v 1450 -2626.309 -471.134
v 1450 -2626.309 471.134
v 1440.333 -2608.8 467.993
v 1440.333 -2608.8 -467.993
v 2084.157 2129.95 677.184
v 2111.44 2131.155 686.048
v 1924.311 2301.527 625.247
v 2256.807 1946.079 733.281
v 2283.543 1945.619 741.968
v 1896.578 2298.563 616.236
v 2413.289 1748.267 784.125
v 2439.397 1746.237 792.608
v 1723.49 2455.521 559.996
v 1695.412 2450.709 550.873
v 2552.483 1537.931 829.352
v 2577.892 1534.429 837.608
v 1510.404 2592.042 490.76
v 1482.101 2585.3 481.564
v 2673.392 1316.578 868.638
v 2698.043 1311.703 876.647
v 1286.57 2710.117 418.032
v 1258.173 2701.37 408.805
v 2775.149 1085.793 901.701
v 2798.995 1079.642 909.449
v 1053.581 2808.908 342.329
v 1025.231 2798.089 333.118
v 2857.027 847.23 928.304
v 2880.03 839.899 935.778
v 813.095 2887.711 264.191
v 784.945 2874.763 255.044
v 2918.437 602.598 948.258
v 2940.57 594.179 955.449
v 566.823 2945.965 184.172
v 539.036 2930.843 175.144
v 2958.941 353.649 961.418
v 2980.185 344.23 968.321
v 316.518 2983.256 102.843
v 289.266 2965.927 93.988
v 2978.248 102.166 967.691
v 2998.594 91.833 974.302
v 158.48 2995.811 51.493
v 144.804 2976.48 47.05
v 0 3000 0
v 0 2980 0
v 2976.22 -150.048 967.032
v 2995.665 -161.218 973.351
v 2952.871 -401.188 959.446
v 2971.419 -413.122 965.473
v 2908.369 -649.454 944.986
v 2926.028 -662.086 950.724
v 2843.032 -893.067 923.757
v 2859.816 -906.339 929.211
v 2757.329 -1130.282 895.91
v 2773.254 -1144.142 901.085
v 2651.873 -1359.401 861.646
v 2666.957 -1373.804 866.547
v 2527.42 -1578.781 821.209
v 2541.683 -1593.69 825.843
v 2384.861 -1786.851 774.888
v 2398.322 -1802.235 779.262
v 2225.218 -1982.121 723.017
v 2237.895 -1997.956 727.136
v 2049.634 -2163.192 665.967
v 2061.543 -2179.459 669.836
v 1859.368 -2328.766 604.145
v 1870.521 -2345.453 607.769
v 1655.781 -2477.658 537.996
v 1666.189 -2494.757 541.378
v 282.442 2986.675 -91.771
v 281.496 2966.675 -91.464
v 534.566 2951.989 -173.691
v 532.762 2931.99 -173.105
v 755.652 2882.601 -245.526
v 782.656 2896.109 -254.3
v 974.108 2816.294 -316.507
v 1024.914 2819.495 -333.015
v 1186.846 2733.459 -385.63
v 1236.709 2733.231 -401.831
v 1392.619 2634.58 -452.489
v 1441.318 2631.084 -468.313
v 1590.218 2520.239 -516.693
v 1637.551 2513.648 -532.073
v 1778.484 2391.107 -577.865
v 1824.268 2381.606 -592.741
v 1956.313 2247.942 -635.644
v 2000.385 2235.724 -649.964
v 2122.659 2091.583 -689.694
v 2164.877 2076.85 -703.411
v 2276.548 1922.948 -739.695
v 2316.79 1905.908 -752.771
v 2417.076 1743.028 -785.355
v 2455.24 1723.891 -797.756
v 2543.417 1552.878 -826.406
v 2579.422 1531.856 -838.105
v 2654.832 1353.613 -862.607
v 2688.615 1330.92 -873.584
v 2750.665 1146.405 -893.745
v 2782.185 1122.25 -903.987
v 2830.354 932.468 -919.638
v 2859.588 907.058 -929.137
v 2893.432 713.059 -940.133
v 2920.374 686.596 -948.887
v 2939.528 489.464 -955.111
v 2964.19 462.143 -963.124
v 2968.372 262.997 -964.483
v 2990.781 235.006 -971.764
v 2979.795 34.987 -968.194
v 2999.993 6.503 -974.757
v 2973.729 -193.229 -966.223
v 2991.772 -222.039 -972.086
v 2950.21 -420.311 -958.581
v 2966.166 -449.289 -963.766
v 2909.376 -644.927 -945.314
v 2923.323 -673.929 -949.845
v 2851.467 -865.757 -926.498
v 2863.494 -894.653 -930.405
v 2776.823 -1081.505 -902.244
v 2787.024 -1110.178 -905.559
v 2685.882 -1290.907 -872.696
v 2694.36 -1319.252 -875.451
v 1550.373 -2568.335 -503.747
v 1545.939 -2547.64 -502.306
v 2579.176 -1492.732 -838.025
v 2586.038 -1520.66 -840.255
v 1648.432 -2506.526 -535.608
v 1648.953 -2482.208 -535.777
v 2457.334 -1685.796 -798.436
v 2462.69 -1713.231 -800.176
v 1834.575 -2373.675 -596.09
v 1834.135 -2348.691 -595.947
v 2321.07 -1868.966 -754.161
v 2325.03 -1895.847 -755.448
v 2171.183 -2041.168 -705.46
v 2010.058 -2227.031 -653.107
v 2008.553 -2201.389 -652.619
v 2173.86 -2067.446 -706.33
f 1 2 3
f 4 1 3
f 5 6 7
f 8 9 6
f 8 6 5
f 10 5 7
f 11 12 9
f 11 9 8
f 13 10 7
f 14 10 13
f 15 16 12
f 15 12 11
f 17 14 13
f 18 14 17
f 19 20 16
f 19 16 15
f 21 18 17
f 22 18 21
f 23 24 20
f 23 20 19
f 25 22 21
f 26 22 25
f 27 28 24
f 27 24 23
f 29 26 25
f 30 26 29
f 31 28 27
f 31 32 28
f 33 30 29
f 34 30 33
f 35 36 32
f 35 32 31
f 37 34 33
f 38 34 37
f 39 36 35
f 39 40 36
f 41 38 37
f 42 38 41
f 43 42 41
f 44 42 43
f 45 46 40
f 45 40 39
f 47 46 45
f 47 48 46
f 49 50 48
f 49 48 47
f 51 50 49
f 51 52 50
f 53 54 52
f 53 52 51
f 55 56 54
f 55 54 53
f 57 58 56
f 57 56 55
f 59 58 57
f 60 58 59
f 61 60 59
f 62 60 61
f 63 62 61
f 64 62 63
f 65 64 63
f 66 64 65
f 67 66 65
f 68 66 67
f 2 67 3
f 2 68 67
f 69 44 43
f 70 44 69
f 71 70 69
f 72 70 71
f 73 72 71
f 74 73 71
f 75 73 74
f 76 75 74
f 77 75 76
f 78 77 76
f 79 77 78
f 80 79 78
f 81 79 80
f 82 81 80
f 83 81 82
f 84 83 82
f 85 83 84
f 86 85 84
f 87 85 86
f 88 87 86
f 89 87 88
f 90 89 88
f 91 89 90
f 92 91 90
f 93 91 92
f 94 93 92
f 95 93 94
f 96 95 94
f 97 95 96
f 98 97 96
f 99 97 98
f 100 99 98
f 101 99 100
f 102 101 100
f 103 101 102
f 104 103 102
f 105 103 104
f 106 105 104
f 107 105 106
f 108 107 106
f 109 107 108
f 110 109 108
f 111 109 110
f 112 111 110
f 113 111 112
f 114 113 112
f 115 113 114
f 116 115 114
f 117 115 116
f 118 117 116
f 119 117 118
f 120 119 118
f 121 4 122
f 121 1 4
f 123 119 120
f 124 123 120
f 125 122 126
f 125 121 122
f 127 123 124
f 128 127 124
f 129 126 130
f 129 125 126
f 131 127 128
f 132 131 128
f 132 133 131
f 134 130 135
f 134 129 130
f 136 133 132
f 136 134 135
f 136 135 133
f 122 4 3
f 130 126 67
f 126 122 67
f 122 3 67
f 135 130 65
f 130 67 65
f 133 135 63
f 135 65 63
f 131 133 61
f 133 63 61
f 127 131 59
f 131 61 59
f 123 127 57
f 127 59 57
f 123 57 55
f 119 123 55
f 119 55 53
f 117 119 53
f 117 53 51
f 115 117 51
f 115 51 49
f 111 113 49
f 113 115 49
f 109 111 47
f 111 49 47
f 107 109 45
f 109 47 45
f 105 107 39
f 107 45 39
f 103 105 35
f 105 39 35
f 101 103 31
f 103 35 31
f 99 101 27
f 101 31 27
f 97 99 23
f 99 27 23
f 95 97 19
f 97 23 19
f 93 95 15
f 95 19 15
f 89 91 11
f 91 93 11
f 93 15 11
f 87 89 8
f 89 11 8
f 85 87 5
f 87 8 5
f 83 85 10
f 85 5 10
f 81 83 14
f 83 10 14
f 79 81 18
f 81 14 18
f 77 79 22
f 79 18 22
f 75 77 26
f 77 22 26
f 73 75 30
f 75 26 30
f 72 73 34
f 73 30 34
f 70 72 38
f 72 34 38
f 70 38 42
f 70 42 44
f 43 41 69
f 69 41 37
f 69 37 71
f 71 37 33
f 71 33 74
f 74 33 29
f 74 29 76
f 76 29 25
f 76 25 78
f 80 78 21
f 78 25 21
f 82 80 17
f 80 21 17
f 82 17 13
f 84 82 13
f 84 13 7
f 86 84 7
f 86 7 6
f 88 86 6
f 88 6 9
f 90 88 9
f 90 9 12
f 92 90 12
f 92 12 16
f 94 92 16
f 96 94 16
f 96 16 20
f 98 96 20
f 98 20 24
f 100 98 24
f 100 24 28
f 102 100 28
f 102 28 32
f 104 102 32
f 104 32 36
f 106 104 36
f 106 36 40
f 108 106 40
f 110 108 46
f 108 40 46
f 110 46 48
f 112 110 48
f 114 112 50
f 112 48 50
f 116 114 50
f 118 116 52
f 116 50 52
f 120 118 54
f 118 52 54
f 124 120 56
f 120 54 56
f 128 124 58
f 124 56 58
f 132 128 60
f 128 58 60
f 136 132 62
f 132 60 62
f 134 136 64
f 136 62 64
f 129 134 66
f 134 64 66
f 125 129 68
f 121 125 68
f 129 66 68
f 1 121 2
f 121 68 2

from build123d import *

# Parameters (mm, degrees)
AUFSATZ_LINEAR_AUSTRAGEN3_DEPTH      = 1500
AUFSATZ_LINEAR_AUSTRAGEN3_DEPTH_BACK = 1500
SCHNITT_LINEAR_AUSTRAGEN4_DEPTH      = 6458
SCHNITT_LINEAR_AUSTRAGEN14_DEPTH     = 6458


with BuildPart() as part:
    # Skizze1 → Aufsatz-Linear austragen3 (new body, two sides)
    with BuildSketch(Plane.XY) as aufsatz_linear_austragen3_sk:
        with BuildLine():
            Line((0, 2980), (0, 3000))
            ThreePointArc((0, 3000), (2905.075523287, 748.689658002), (1450, -2626.309197334))
            Line((1450, -2626.309197334), (1440.333333333, -2608.800469352))
            ThreePointArc((1440.333333333, -2608.800469352), (2885.708353132, 743.698393615), (0, 2980))
        make_face()
    extrude(amount=AUFSATZ_LINEAR_AUSTRAGEN3_DEPTH)
    extrude(aufsatz_linear_austragen3_sk.sketch, amount=-AUFSATZ_LINEAR_AUSTRAGEN3_DEPTH_BACK)

    # Skizze7 → Schnitt-Linear austragen4 (cut)
    with BuildSketch(Plane(origin=(0, -3000, 0), x_dir=(1, 0, 0), z_dir=(0, 1, 0))):
        Polygon((3541.107848253, -1150.575686383), (0, 0), (0, -1500), (3541.107848253, -1500), align=None)
    extrude(amount=SCHNITT_LINEAR_AUSTRAGEN4_DEPTH, mode=Mode.SUBTRACT)

    # Skizze9 → Schnitt-Linear austragen14 (cut)
    with BuildSketch(Plane(origin=(0, -3000, 0), x_dir=(1, 0, 0), z_dir=(0, 1, 0))):
        Polygon((0, 0), (2853.169548885, 927.050983125), (3389.262998564, 1101.238303947), (3389.262998564, 1500), (0, 1500), align=None)
    extrude(amount=SCHNITT_LINEAR_AUSTRAGEN14_DEPTH, mode=Mode.SUBTRACT)


solid = part.part
